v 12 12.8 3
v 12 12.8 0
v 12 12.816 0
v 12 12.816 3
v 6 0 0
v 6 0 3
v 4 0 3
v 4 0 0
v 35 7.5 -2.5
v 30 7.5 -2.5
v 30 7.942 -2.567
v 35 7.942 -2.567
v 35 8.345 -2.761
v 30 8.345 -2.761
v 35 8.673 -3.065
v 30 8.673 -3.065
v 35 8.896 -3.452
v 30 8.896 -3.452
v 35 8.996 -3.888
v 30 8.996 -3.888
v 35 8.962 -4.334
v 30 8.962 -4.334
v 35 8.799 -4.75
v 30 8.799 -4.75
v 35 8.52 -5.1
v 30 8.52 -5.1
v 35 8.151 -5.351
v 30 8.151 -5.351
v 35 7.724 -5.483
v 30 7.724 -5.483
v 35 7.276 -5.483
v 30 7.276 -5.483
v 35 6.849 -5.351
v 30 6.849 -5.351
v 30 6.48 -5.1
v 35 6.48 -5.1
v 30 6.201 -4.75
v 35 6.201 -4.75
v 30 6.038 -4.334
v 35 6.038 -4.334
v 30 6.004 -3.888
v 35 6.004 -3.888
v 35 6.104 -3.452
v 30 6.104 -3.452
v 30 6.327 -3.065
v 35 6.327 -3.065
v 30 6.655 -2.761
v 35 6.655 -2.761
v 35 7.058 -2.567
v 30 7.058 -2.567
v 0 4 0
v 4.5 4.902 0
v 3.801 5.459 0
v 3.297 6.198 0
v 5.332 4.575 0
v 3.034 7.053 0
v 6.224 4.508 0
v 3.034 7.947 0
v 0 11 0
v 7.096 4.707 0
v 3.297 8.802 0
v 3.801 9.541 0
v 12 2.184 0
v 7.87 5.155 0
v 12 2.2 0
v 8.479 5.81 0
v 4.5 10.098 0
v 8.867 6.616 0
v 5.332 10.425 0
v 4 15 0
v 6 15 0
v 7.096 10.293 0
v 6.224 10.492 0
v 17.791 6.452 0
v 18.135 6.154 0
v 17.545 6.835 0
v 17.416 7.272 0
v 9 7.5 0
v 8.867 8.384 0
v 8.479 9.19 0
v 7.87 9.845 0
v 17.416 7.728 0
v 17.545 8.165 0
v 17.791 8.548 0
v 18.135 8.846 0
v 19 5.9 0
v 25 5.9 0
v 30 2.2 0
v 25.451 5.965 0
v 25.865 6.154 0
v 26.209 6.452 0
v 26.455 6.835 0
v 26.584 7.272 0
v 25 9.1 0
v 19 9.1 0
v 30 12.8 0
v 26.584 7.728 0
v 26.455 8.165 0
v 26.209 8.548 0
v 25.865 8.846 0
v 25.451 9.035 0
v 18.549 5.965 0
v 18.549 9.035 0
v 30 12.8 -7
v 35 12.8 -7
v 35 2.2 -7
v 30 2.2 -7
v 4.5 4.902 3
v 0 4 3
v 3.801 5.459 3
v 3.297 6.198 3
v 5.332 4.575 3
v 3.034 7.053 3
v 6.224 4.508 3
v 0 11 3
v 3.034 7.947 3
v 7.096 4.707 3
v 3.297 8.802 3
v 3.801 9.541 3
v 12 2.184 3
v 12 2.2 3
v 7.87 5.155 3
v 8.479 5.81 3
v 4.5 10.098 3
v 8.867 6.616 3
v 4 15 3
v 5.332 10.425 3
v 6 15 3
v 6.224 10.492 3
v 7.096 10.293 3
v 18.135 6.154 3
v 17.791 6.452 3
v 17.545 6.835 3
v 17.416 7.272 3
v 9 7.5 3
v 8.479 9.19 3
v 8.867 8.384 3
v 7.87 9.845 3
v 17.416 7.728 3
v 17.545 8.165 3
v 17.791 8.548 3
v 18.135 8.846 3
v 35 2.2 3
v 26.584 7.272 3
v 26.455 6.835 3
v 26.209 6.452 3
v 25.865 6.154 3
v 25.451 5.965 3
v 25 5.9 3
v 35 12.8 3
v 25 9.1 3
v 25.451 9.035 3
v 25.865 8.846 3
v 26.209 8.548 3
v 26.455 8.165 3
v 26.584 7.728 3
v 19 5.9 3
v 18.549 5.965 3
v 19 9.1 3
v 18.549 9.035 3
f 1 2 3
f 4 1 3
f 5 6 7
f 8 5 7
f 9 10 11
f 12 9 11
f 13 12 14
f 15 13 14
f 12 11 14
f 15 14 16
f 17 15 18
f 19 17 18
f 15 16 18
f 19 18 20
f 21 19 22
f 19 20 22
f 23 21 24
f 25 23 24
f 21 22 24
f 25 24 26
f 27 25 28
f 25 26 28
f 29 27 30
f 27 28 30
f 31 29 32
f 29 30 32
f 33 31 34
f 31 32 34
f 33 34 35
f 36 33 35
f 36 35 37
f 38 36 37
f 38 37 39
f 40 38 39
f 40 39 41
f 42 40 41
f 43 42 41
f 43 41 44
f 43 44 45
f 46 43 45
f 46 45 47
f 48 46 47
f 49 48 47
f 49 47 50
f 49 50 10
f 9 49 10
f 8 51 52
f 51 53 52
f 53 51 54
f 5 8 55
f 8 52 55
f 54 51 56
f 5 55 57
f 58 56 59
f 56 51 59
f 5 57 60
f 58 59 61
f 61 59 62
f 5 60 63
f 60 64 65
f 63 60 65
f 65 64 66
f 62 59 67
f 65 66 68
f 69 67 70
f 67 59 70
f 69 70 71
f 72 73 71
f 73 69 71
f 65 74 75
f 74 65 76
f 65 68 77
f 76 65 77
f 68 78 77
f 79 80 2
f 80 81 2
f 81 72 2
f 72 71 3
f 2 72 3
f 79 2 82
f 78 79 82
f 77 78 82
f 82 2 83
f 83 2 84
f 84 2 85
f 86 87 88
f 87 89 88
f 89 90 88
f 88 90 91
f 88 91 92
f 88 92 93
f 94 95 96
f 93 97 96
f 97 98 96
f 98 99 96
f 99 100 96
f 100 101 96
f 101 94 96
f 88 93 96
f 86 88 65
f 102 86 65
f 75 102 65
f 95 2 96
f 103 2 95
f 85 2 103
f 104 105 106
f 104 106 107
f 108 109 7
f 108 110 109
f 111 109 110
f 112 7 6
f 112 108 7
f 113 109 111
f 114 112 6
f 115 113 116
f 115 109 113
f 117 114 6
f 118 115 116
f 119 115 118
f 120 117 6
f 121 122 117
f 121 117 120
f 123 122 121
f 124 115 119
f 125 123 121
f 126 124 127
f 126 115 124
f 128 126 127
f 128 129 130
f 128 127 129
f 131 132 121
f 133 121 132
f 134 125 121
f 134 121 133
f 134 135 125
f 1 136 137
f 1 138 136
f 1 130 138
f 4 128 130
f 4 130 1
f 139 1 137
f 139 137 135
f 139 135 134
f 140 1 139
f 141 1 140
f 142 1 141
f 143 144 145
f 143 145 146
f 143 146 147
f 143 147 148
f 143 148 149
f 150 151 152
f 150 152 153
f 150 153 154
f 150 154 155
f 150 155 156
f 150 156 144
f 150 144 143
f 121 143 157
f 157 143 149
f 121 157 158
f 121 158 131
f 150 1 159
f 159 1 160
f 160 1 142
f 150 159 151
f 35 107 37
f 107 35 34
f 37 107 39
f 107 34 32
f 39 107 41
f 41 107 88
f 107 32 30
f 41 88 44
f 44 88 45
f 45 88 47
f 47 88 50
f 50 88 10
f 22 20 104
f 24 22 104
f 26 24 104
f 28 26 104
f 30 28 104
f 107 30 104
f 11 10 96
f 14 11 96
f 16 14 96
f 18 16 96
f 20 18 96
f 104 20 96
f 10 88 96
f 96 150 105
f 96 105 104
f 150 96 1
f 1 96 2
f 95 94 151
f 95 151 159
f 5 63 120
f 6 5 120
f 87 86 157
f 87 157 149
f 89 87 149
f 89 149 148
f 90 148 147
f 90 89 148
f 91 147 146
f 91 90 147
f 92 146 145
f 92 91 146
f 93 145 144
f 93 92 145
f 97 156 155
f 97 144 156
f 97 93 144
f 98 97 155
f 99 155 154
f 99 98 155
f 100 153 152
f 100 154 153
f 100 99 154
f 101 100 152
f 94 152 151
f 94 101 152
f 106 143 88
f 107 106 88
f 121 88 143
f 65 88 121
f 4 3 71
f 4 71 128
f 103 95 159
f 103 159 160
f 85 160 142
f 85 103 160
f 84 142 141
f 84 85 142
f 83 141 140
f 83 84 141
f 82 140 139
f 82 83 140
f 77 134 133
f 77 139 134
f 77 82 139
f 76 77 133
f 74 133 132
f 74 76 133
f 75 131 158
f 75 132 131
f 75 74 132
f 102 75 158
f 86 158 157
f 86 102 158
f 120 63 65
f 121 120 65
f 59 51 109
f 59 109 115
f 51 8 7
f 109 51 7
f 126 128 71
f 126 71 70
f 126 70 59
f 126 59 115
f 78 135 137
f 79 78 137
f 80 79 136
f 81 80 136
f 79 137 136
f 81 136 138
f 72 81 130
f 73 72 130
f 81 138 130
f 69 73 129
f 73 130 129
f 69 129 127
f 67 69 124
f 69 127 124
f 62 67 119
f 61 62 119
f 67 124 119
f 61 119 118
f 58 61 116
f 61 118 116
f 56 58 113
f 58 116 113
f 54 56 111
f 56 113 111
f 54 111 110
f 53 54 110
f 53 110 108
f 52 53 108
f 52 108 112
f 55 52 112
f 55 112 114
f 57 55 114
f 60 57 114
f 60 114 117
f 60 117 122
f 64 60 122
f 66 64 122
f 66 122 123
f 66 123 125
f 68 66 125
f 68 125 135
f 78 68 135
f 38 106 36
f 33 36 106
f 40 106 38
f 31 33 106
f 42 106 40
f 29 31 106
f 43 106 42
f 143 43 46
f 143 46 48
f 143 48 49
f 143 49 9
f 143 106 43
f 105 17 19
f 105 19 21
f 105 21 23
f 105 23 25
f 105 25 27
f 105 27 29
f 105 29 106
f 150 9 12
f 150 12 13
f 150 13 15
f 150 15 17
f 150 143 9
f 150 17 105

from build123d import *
from OCP.BRepFilletAPI import BRepFilletAPI_MakeChamfer

# Parameters (mm, degrees)
ESQUISSE1_W             = 35
ESQUISSE1_H             = 15
BOSS_EXTRU_1_DEPTH      = 3
ESQUISSE4_R             = 3
ENL_V_MAT_EXTRU_1_DEPTH = 39.19685851
CHANFREIN1_SIZE         = 4
ENL_V_MAT_EXTRU_2_DEPTH = 39.19685851
ESQUISSE6_W             = 5
ESQUISSE6_H             = 15
BOSS_EXTRU_2_DEPTH      = 7
ESQUISSE7_W             = 23
ESQUISSE7_H             = 2.2
ENL_V_MAT_EXTRU_3_DEPTH = 40.37003937
CHANFREIN2_SIZE         = 6
CHANFREIN2_SIZE2        = 2.183821406
ESQUISSE8_R             = 1.5
ENL_V_MAT_EXTRU_4_DEPTH = 7


with BuildPart() as part:
    # Esquisse1 → Boss.-Extru.1 (new body)
    with BuildSketch(Plane.XY):
        with Locations((17.5, 7.5)):
            Rectangle(ESQUISSE1_W, ESQUISSE1_H)
    extrude(amount=BOSS_EXTRU_1_DEPTH)

    # Esquisse4 → Enlèv. mat.-Extru.1 (cut, through all)
    with BuildSketch(Plane.XY.offset(3)):
        with Locations((6, 7.5)):
            Circle(ESQUISSE4_R)
    extrude(amount=-ENL_V_MAT_EXTRU_1_DEPTH, mode=Mode.SUBTRACT)

    # Chanfrein1
    chanfrein1_edges = [part.edges().sort_by_distance(p)[0] for p in [
        (0, 15, 1.5),
        (0, 0, 1.5),
    ]]
    chamfer(chanfrein1_edges, length=CHANFREIN1_SIZE)

    # Esquisse5 → Enlèv. mat.-Extru.2 (cut, through all)
    with BuildSketch(Plane(origin=(0, 0, 0), x_dir=(-1, 0, 0), z_dir=(0, 0, -1))):
        with BuildLine():
            Line((-19, 5.9), (-25, 5.9))
            ThreePointArc((-25, 5.9), (-26.6, 7.5), (-25, 9.1))
            Line((-25, 9.1), (-19, 9.1))
            ThreePointArc((-19, 9.1), (-17.4, 7.5), (-19, 5.9))
        make_face()
    extrude(amount=-ENL_V_MAT_EXTRU_2_DEPTH, mode=Mode.SUBTRACT)

    # Esquisse6 → Boss.-Extru.2 (add)
    with BuildSketch(Plane(origin=(0, 0, 0), x_dir=(-1, 0, 0), z_dir=(0, 0, -1))):
        with Locations((-32.5, 7.5)):
            Rectangle(ESQUISSE6_W, ESQUISSE6_H)
    extrude(amount=BOSS_EXTRU_2_DEPTH)

    # Esquisse7 → Enlèv. mat.-Extru.3 (cut, through all)
    with BuildSketch(Plane(origin=(0, 0, -7), x_dir=(-1, 0, 0), z_dir=(0, 0, -1))):
        with Locations((-23.5, 1.1)):
            Rectangle(ESQUISSE7_W, ESQUISSE7_H)
        with Locations((-23.5, 13.9)):
            Rectangle(ESQUISSE7_W, ESQUISSE7_H)
    extrude(amount=-ENL_V_MAT_EXTRU_3_DEPTH, mode=Mode.SUBTRACT)

    # Chanfrein2: one chamfer whose edges measure the first distance from different faces: ONE call of the kernel's chamfer builder (chamfer() names one face for all edges)
    chanfrein2_edges_1 = [part.edges().sort_by_distance(p)[0] for p in [
        (12, 0, 1.5),
    ]]
    chanfrein2_side_1 = [part.faces().sort_by_distance(p)[0] for p in [
        (8, 0, 1.5),
    ]]
    chanfrein2_edges_2 = [part.edges().sort_by_distance(p)[0] for p in [
        (12, 15, 1.5),
    ]]
    chanfrein2_side_2 = [part.faces().sort_by_distance(p)[0] for p in [
        (8, 15, 1.5),
    ]]
    chanfrein2 = BRepFilletAPI_MakeChamfer(part.part.solid().wrapped)
    for e in chanfrein2_edges_1:
        chanfrein2.Add(CHANFREIN2_SIZE, CHANFREIN2_SIZE2, e.wrapped, chanfrein2_side_1[0].wrapped)  # the first distance lies on this face
    for e in chanfrein2_edges_2:
        chanfrein2.Add(CHANFREIN2_SIZE, CHANFREIN2_SIZE2, e.wrapped, chanfrein2_side_2[0].wrapped)  # the first distance lies on this face
    add(Compound.cast(chanfrein2.Shape()), mode=Mode.REPLACE)

    # Esquisse8 → Enlèv. mat.-Extru.4 (cut)
    with BuildSketch(Plane.ZY.offset(-30)):
        with Locations((-4, 7.5)):
            Circle(ESQUISSE8_R)
    extrude(amount=-ENL_V_MAT_EXTRU_4_DEPTH, mode=Mode.SUBTRACT)


solid = part.part
